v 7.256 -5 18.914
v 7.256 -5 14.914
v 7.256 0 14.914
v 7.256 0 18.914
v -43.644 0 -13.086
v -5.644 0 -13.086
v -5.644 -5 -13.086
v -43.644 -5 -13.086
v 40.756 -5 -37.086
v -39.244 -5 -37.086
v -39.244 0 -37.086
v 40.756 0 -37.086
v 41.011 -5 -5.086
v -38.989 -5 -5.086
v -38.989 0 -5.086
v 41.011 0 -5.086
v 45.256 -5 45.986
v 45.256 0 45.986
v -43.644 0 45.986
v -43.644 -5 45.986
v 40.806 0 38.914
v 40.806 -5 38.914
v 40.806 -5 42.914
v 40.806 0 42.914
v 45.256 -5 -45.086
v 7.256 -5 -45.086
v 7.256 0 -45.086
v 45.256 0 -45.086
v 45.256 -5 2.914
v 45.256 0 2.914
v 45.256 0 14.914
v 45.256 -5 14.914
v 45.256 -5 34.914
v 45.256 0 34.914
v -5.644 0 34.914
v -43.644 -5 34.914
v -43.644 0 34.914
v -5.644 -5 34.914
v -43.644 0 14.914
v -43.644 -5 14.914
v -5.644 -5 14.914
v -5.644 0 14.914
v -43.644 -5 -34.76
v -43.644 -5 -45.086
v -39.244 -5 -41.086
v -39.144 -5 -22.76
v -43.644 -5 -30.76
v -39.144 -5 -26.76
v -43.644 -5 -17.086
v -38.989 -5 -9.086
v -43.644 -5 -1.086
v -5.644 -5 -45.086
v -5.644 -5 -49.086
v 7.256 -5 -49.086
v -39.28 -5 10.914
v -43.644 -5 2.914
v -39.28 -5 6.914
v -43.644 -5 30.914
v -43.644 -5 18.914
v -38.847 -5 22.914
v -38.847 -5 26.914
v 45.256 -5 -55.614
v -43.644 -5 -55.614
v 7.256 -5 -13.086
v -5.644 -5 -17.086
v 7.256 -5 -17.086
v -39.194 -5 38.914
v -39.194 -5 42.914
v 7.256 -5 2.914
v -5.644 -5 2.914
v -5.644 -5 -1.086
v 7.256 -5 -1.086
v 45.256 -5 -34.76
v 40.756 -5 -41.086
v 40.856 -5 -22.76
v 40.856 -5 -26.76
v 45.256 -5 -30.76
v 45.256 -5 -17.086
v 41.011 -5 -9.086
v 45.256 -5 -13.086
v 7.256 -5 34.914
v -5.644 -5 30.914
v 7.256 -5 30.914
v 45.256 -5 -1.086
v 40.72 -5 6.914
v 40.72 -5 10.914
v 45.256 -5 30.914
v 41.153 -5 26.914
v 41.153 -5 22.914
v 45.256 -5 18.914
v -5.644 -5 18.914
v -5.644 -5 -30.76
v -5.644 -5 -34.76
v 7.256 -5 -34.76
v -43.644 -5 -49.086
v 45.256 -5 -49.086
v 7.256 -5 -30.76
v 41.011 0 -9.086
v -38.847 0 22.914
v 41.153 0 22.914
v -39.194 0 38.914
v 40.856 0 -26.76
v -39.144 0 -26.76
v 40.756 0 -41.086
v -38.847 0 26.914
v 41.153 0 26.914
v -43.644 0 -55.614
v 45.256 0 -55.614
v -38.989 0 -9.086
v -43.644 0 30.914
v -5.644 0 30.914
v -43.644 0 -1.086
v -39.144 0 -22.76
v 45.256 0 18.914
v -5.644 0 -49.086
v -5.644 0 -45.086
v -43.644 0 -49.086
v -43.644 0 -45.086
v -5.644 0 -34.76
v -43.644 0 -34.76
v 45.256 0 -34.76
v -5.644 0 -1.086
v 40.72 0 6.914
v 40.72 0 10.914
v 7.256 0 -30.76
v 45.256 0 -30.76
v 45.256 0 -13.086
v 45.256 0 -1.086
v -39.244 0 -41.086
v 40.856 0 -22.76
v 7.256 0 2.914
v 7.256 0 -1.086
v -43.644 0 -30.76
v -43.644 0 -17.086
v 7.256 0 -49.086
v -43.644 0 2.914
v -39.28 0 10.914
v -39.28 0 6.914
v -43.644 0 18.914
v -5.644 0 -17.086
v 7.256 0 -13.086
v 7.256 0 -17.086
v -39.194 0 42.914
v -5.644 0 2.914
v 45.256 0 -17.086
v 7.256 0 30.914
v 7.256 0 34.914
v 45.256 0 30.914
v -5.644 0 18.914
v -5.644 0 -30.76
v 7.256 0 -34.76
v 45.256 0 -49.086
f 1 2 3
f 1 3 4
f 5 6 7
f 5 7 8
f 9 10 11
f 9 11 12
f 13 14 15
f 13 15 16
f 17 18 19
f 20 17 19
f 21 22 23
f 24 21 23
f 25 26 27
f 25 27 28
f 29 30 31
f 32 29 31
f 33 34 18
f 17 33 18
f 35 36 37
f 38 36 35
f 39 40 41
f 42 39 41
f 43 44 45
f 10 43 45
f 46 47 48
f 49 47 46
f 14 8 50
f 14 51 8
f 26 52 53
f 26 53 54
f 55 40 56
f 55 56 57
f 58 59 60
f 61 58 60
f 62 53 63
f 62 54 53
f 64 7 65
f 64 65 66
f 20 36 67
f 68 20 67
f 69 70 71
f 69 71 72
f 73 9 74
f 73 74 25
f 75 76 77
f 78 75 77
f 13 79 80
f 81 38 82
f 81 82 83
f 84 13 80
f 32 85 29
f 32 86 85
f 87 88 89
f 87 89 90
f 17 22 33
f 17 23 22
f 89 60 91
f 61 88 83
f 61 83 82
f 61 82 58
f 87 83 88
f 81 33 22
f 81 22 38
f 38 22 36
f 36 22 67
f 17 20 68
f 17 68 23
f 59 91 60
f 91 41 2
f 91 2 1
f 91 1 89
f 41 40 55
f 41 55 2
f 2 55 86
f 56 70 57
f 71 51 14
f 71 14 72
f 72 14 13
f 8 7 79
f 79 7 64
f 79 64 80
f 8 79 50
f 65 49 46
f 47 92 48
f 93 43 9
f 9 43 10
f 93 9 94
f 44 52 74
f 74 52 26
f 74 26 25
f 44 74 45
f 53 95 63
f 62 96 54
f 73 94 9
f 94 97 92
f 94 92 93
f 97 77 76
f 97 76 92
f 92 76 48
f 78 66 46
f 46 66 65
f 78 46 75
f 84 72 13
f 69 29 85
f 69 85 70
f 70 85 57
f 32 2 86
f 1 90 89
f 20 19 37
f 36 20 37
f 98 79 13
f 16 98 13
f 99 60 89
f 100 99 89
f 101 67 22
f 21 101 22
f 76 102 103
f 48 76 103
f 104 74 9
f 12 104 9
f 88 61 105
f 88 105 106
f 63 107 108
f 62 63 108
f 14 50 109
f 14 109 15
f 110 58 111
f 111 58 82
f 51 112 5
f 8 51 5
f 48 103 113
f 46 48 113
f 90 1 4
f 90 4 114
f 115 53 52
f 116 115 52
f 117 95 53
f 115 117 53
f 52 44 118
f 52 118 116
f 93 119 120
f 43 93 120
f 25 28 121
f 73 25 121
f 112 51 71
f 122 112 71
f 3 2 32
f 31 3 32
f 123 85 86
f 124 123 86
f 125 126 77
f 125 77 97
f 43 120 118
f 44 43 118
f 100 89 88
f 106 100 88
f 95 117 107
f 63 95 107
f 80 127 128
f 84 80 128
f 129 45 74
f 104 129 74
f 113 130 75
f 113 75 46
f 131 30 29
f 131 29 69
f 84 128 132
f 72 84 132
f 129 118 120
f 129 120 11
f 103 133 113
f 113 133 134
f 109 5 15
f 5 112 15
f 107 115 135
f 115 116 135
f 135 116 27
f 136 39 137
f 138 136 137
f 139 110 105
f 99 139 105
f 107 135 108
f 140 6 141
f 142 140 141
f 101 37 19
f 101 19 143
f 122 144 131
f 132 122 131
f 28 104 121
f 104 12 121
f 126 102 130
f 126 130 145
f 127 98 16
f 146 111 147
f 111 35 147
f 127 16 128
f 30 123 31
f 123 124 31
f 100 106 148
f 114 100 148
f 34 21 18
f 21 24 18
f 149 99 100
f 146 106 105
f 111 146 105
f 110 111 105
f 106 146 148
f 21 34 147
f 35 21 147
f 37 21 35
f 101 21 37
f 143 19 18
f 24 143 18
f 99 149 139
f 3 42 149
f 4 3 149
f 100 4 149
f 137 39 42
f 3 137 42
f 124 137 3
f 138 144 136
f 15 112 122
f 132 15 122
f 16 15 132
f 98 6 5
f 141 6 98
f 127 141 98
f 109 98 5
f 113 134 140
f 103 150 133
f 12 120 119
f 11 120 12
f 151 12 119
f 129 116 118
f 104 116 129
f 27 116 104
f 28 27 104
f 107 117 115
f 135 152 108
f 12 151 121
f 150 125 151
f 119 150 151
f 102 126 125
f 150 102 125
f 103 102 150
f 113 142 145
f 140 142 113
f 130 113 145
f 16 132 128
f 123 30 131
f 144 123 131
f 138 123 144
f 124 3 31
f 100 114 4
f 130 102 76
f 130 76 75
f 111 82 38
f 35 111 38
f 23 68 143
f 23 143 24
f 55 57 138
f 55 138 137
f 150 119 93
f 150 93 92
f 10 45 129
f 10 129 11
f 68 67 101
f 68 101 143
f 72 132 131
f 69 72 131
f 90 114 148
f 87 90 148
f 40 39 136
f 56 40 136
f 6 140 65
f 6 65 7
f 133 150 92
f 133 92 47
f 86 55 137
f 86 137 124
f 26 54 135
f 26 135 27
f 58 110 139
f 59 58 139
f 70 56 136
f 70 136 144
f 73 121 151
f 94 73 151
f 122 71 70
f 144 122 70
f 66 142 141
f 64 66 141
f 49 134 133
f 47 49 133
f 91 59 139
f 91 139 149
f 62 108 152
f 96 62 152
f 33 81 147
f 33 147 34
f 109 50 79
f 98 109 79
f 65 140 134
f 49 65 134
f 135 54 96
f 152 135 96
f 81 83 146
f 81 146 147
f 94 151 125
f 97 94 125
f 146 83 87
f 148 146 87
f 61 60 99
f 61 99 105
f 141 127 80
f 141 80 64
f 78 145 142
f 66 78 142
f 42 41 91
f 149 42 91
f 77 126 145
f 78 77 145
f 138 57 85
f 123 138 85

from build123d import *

# Parameters (mm, degrees)
F0_W      = 39.178138
F0_H      = 3.5
F0_W_2    = 40.821862
F1_DEPTH  = 5
F2_W      = 80
F2_H      = 4
F2_W_2    = 33.202673
F3_DEPTH  = 12
F4_W      = 7.437948
F4_H      = 4
F5_DEPTH  = 12
F6_W      = 38
F6_H      = 4
F7_DEPTH  = 12
F8_W      = 38
F8_H      = 4
F9_DEPTH  = 12
F10_W     = 38
F10_H     = 4
F11_DEPTH = 12
F12_W     = 38
F12_H     = 4
F13_DEPTH = 12
F14_W     = 38
F14_H     = 4
F15_DEPTH = 12
F16_W     = 38
F16_H     = 4
F17_DEPTH = 12
F18_W     = 38
F18_H     = 4
F19_DEPTH = 12
F20_W     = 80
F20_H     = 4
F21_DEPTH = 12
F22_W     = 38
F22_H     = 4
F23_DEPTH = 12
F24_W     = 38
F24_H     = 4
F25_DEPTH = 12
F26_W     = 38
F26_H     = 4
F27_DEPTH = 25
F28_W     = 38
F28_H     = 4
F29_DEPTH = 25


with BuildPart() as f1:
    # F0 (on Front) → F1 (new body)
    with BuildSketch(Plane.XZ):
        Polygon((0.805769, 45.985782), (-43.644231, 45.985782), (-43.644231, -55.614218), (0.805769, -55.614218), (0.805769, 37.953567), (-38.372369, 37.953567), (-38.372369, 41.453567), (0.805769, 41.453567), align=None)
        Polygon((45.255769, 45.985782), (0.805769, 45.985782), (0.805769, 41.453567), (41.627631, 41.453567), (41.627631, 37.953567), (0.805769, 37.953567), (0.805769, -55.614218), (45.255769, -55.614218), align=None)
        with Locations((-18.7833, 39.703567)):
            Rectangle(F0_W, F0_H)
        with Locations((21.2167, 39.703567)):
            Rectangle(F0_W_2, F0_H)
    extrude(amount=F1_DEPTH)

    # F2 (on face) → F3 (cut)
    with BuildSketch(Plane.XZ.offset(5)):
        with Locations((0.72034, 8.914189)):
            Rectangle(F2_W, F2_H)
        with Locations((1.153096, 24.914189)):
            Rectangle(F2_W, F2_H)
        with Locations((0.755769, -39.085811)):
            Rectangle(F2_W, F2_H)
        with Locations((0.805769, 40.914189)):
            Rectangle(F2_W, F2_H)
        with Locations((1.011494, -7.085811)):
            Rectangle(F2_W, F2_H)
        with Locations((-22.245567, 32.914189)):
            Rectangle(F2_W_2, F2_H)
    extrude(amount=-F3_DEPTH, mode=Mode.SUBTRACT)

    # F4 (on face) → F5 (cut)
    with BuildSketch(Plane.XZ.offset(5)):
        with Locations((-39.925257, 32.914189)):
            Rectangle(F4_W, F4_H)
    extrude(amount=-F5_DEPTH, mode=Mode.SUBTRACT)

    # F6 (on face) → F7 (cut)
    with BuildSketch(Plane.XZ.offset(5)):
        with Locations((26.255769, 32.914189)):
            Rectangle(F6_W, F6_H)
    extrude(amount=-F7_DEPTH, mode=Mode.SUBTRACT)

    # F8 (on face) → F9 (cut)
    with BuildSketch(Plane.XZ.offset(5)):
        with Locations((-24.644231, 16.914189)):
            Rectangle(F8_W, F8_H)
    extrude(amount=-F9_DEPTH, mode=Mode.SUBTRACT)

    # F10 (on face) → F11 (cut)
    with BuildSketch(Plane.XZ.offset(5)):
        with Locations((26.255769, 16.914189)):
            Rectangle(F10_W, F10_H)
    extrude(amount=-F11_DEPTH, mode=Mode.SUBTRACT)

    # F12 (on face) → F13 (cut)
    with BuildSketch(Plane.XZ.offset(5)):
        with Locations((-24.644231, 0.914189)):
            Rectangle(F12_W, F12_H)
    extrude(amount=-F13_DEPTH, mode=Mode.SUBTRACT)

    # F14 (on face) → F15 (cut)
    with BuildSketch(Plane(origin=(0, 0, 0), x_dir=(-1, 0, 0), z_dir=(0, 1, 0))):
        with Locations((-26.255769, 0.914189)):
            Rectangle(F14_W, F14_H)
    extrude(amount=-F15_DEPTH, mode=Mode.SUBTRACT)

    # F16 (on face) → F17 (cut)
    with BuildSketch(Plane(origin=(0, 0, 0), x_dir=(-1, 0, 0), z_dir=(0, 1, 0))):
        with Locations((-26.255769, -15.085811)):
            Rectangle(F16_W, F16_H)
    extrude(amount=-F17_DEPTH, mode=Mode.SUBTRACT)

    # F18 (on face) → F19 (cut)
    with BuildSketch(Plane(origin=(0, 0, 0), x_dir=(-1, 0, 0), z_dir=(0, 1, 0))):
        with Locations((24.644231, -15.085811)):
            Rectangle(F18_W, F18_H)
    extrude(amount=-F19_DEPTH, mode=Mode.SUBTRACT)

    # F20 (on face) → F21 (cut)
    with BuildSketch(Plane(origin=(0, 0, 0), x_dir=(-1, 0, 0), z_dir=(0, 1, 0))):
        with Locations((-0.855769, -24.760461)):
            Rectangle(F20_W, F20_H)
    extrude(amount=-F21_DEPTH, mode=Mode.SUBTRACT)

    # F22 (on face) → F23 (cut)
    with BuildSketch(Plane(origin=(0, 0, 0), x_dir=(-1, 0, 0), z_dir=(0, 1, 0))):
        with Locations((-26.255769, -32.760461)):
            Rectangle(F22_W, F22_H)
    extrude(amount=-F23_DEPTH, mode=Mode.SUBTRACT)

    # F24 (on face) → F25 (cut)
    with BuildSketch(Plane(origin=(0, 0, 0), x_dir=(-1, 0, 0), z_dir=(0, 1, 0))):
        with Locations((24.644231, -32.760461)):
            Rectangle(F24_W, F24_H)
    extrude(amount=-F25_DEPTH, mode=Mode.SUBTRACT)

    # F26 (on face) → F27 (cut)
    with BuildSketch(Plane.XZ.offset(5)):
        with Locations((-24.644231, -47.085811)):
            Rectangle(F26_W, F26_H)
    extrude(amount=-F27_DEPTH, mode=Mode.SUBTRACT)

    # F28 (on face) → F29 (cut)
    with BuildSketch(Plane.XZ.offset(5)):
        with Locations((26.255769, -47.085811)):
            Rectangle(F28_W, F28_H)
    extrude(amount=-F29_DEPTH, mode=Mode.SUBTRACT)


solid = f1.part
